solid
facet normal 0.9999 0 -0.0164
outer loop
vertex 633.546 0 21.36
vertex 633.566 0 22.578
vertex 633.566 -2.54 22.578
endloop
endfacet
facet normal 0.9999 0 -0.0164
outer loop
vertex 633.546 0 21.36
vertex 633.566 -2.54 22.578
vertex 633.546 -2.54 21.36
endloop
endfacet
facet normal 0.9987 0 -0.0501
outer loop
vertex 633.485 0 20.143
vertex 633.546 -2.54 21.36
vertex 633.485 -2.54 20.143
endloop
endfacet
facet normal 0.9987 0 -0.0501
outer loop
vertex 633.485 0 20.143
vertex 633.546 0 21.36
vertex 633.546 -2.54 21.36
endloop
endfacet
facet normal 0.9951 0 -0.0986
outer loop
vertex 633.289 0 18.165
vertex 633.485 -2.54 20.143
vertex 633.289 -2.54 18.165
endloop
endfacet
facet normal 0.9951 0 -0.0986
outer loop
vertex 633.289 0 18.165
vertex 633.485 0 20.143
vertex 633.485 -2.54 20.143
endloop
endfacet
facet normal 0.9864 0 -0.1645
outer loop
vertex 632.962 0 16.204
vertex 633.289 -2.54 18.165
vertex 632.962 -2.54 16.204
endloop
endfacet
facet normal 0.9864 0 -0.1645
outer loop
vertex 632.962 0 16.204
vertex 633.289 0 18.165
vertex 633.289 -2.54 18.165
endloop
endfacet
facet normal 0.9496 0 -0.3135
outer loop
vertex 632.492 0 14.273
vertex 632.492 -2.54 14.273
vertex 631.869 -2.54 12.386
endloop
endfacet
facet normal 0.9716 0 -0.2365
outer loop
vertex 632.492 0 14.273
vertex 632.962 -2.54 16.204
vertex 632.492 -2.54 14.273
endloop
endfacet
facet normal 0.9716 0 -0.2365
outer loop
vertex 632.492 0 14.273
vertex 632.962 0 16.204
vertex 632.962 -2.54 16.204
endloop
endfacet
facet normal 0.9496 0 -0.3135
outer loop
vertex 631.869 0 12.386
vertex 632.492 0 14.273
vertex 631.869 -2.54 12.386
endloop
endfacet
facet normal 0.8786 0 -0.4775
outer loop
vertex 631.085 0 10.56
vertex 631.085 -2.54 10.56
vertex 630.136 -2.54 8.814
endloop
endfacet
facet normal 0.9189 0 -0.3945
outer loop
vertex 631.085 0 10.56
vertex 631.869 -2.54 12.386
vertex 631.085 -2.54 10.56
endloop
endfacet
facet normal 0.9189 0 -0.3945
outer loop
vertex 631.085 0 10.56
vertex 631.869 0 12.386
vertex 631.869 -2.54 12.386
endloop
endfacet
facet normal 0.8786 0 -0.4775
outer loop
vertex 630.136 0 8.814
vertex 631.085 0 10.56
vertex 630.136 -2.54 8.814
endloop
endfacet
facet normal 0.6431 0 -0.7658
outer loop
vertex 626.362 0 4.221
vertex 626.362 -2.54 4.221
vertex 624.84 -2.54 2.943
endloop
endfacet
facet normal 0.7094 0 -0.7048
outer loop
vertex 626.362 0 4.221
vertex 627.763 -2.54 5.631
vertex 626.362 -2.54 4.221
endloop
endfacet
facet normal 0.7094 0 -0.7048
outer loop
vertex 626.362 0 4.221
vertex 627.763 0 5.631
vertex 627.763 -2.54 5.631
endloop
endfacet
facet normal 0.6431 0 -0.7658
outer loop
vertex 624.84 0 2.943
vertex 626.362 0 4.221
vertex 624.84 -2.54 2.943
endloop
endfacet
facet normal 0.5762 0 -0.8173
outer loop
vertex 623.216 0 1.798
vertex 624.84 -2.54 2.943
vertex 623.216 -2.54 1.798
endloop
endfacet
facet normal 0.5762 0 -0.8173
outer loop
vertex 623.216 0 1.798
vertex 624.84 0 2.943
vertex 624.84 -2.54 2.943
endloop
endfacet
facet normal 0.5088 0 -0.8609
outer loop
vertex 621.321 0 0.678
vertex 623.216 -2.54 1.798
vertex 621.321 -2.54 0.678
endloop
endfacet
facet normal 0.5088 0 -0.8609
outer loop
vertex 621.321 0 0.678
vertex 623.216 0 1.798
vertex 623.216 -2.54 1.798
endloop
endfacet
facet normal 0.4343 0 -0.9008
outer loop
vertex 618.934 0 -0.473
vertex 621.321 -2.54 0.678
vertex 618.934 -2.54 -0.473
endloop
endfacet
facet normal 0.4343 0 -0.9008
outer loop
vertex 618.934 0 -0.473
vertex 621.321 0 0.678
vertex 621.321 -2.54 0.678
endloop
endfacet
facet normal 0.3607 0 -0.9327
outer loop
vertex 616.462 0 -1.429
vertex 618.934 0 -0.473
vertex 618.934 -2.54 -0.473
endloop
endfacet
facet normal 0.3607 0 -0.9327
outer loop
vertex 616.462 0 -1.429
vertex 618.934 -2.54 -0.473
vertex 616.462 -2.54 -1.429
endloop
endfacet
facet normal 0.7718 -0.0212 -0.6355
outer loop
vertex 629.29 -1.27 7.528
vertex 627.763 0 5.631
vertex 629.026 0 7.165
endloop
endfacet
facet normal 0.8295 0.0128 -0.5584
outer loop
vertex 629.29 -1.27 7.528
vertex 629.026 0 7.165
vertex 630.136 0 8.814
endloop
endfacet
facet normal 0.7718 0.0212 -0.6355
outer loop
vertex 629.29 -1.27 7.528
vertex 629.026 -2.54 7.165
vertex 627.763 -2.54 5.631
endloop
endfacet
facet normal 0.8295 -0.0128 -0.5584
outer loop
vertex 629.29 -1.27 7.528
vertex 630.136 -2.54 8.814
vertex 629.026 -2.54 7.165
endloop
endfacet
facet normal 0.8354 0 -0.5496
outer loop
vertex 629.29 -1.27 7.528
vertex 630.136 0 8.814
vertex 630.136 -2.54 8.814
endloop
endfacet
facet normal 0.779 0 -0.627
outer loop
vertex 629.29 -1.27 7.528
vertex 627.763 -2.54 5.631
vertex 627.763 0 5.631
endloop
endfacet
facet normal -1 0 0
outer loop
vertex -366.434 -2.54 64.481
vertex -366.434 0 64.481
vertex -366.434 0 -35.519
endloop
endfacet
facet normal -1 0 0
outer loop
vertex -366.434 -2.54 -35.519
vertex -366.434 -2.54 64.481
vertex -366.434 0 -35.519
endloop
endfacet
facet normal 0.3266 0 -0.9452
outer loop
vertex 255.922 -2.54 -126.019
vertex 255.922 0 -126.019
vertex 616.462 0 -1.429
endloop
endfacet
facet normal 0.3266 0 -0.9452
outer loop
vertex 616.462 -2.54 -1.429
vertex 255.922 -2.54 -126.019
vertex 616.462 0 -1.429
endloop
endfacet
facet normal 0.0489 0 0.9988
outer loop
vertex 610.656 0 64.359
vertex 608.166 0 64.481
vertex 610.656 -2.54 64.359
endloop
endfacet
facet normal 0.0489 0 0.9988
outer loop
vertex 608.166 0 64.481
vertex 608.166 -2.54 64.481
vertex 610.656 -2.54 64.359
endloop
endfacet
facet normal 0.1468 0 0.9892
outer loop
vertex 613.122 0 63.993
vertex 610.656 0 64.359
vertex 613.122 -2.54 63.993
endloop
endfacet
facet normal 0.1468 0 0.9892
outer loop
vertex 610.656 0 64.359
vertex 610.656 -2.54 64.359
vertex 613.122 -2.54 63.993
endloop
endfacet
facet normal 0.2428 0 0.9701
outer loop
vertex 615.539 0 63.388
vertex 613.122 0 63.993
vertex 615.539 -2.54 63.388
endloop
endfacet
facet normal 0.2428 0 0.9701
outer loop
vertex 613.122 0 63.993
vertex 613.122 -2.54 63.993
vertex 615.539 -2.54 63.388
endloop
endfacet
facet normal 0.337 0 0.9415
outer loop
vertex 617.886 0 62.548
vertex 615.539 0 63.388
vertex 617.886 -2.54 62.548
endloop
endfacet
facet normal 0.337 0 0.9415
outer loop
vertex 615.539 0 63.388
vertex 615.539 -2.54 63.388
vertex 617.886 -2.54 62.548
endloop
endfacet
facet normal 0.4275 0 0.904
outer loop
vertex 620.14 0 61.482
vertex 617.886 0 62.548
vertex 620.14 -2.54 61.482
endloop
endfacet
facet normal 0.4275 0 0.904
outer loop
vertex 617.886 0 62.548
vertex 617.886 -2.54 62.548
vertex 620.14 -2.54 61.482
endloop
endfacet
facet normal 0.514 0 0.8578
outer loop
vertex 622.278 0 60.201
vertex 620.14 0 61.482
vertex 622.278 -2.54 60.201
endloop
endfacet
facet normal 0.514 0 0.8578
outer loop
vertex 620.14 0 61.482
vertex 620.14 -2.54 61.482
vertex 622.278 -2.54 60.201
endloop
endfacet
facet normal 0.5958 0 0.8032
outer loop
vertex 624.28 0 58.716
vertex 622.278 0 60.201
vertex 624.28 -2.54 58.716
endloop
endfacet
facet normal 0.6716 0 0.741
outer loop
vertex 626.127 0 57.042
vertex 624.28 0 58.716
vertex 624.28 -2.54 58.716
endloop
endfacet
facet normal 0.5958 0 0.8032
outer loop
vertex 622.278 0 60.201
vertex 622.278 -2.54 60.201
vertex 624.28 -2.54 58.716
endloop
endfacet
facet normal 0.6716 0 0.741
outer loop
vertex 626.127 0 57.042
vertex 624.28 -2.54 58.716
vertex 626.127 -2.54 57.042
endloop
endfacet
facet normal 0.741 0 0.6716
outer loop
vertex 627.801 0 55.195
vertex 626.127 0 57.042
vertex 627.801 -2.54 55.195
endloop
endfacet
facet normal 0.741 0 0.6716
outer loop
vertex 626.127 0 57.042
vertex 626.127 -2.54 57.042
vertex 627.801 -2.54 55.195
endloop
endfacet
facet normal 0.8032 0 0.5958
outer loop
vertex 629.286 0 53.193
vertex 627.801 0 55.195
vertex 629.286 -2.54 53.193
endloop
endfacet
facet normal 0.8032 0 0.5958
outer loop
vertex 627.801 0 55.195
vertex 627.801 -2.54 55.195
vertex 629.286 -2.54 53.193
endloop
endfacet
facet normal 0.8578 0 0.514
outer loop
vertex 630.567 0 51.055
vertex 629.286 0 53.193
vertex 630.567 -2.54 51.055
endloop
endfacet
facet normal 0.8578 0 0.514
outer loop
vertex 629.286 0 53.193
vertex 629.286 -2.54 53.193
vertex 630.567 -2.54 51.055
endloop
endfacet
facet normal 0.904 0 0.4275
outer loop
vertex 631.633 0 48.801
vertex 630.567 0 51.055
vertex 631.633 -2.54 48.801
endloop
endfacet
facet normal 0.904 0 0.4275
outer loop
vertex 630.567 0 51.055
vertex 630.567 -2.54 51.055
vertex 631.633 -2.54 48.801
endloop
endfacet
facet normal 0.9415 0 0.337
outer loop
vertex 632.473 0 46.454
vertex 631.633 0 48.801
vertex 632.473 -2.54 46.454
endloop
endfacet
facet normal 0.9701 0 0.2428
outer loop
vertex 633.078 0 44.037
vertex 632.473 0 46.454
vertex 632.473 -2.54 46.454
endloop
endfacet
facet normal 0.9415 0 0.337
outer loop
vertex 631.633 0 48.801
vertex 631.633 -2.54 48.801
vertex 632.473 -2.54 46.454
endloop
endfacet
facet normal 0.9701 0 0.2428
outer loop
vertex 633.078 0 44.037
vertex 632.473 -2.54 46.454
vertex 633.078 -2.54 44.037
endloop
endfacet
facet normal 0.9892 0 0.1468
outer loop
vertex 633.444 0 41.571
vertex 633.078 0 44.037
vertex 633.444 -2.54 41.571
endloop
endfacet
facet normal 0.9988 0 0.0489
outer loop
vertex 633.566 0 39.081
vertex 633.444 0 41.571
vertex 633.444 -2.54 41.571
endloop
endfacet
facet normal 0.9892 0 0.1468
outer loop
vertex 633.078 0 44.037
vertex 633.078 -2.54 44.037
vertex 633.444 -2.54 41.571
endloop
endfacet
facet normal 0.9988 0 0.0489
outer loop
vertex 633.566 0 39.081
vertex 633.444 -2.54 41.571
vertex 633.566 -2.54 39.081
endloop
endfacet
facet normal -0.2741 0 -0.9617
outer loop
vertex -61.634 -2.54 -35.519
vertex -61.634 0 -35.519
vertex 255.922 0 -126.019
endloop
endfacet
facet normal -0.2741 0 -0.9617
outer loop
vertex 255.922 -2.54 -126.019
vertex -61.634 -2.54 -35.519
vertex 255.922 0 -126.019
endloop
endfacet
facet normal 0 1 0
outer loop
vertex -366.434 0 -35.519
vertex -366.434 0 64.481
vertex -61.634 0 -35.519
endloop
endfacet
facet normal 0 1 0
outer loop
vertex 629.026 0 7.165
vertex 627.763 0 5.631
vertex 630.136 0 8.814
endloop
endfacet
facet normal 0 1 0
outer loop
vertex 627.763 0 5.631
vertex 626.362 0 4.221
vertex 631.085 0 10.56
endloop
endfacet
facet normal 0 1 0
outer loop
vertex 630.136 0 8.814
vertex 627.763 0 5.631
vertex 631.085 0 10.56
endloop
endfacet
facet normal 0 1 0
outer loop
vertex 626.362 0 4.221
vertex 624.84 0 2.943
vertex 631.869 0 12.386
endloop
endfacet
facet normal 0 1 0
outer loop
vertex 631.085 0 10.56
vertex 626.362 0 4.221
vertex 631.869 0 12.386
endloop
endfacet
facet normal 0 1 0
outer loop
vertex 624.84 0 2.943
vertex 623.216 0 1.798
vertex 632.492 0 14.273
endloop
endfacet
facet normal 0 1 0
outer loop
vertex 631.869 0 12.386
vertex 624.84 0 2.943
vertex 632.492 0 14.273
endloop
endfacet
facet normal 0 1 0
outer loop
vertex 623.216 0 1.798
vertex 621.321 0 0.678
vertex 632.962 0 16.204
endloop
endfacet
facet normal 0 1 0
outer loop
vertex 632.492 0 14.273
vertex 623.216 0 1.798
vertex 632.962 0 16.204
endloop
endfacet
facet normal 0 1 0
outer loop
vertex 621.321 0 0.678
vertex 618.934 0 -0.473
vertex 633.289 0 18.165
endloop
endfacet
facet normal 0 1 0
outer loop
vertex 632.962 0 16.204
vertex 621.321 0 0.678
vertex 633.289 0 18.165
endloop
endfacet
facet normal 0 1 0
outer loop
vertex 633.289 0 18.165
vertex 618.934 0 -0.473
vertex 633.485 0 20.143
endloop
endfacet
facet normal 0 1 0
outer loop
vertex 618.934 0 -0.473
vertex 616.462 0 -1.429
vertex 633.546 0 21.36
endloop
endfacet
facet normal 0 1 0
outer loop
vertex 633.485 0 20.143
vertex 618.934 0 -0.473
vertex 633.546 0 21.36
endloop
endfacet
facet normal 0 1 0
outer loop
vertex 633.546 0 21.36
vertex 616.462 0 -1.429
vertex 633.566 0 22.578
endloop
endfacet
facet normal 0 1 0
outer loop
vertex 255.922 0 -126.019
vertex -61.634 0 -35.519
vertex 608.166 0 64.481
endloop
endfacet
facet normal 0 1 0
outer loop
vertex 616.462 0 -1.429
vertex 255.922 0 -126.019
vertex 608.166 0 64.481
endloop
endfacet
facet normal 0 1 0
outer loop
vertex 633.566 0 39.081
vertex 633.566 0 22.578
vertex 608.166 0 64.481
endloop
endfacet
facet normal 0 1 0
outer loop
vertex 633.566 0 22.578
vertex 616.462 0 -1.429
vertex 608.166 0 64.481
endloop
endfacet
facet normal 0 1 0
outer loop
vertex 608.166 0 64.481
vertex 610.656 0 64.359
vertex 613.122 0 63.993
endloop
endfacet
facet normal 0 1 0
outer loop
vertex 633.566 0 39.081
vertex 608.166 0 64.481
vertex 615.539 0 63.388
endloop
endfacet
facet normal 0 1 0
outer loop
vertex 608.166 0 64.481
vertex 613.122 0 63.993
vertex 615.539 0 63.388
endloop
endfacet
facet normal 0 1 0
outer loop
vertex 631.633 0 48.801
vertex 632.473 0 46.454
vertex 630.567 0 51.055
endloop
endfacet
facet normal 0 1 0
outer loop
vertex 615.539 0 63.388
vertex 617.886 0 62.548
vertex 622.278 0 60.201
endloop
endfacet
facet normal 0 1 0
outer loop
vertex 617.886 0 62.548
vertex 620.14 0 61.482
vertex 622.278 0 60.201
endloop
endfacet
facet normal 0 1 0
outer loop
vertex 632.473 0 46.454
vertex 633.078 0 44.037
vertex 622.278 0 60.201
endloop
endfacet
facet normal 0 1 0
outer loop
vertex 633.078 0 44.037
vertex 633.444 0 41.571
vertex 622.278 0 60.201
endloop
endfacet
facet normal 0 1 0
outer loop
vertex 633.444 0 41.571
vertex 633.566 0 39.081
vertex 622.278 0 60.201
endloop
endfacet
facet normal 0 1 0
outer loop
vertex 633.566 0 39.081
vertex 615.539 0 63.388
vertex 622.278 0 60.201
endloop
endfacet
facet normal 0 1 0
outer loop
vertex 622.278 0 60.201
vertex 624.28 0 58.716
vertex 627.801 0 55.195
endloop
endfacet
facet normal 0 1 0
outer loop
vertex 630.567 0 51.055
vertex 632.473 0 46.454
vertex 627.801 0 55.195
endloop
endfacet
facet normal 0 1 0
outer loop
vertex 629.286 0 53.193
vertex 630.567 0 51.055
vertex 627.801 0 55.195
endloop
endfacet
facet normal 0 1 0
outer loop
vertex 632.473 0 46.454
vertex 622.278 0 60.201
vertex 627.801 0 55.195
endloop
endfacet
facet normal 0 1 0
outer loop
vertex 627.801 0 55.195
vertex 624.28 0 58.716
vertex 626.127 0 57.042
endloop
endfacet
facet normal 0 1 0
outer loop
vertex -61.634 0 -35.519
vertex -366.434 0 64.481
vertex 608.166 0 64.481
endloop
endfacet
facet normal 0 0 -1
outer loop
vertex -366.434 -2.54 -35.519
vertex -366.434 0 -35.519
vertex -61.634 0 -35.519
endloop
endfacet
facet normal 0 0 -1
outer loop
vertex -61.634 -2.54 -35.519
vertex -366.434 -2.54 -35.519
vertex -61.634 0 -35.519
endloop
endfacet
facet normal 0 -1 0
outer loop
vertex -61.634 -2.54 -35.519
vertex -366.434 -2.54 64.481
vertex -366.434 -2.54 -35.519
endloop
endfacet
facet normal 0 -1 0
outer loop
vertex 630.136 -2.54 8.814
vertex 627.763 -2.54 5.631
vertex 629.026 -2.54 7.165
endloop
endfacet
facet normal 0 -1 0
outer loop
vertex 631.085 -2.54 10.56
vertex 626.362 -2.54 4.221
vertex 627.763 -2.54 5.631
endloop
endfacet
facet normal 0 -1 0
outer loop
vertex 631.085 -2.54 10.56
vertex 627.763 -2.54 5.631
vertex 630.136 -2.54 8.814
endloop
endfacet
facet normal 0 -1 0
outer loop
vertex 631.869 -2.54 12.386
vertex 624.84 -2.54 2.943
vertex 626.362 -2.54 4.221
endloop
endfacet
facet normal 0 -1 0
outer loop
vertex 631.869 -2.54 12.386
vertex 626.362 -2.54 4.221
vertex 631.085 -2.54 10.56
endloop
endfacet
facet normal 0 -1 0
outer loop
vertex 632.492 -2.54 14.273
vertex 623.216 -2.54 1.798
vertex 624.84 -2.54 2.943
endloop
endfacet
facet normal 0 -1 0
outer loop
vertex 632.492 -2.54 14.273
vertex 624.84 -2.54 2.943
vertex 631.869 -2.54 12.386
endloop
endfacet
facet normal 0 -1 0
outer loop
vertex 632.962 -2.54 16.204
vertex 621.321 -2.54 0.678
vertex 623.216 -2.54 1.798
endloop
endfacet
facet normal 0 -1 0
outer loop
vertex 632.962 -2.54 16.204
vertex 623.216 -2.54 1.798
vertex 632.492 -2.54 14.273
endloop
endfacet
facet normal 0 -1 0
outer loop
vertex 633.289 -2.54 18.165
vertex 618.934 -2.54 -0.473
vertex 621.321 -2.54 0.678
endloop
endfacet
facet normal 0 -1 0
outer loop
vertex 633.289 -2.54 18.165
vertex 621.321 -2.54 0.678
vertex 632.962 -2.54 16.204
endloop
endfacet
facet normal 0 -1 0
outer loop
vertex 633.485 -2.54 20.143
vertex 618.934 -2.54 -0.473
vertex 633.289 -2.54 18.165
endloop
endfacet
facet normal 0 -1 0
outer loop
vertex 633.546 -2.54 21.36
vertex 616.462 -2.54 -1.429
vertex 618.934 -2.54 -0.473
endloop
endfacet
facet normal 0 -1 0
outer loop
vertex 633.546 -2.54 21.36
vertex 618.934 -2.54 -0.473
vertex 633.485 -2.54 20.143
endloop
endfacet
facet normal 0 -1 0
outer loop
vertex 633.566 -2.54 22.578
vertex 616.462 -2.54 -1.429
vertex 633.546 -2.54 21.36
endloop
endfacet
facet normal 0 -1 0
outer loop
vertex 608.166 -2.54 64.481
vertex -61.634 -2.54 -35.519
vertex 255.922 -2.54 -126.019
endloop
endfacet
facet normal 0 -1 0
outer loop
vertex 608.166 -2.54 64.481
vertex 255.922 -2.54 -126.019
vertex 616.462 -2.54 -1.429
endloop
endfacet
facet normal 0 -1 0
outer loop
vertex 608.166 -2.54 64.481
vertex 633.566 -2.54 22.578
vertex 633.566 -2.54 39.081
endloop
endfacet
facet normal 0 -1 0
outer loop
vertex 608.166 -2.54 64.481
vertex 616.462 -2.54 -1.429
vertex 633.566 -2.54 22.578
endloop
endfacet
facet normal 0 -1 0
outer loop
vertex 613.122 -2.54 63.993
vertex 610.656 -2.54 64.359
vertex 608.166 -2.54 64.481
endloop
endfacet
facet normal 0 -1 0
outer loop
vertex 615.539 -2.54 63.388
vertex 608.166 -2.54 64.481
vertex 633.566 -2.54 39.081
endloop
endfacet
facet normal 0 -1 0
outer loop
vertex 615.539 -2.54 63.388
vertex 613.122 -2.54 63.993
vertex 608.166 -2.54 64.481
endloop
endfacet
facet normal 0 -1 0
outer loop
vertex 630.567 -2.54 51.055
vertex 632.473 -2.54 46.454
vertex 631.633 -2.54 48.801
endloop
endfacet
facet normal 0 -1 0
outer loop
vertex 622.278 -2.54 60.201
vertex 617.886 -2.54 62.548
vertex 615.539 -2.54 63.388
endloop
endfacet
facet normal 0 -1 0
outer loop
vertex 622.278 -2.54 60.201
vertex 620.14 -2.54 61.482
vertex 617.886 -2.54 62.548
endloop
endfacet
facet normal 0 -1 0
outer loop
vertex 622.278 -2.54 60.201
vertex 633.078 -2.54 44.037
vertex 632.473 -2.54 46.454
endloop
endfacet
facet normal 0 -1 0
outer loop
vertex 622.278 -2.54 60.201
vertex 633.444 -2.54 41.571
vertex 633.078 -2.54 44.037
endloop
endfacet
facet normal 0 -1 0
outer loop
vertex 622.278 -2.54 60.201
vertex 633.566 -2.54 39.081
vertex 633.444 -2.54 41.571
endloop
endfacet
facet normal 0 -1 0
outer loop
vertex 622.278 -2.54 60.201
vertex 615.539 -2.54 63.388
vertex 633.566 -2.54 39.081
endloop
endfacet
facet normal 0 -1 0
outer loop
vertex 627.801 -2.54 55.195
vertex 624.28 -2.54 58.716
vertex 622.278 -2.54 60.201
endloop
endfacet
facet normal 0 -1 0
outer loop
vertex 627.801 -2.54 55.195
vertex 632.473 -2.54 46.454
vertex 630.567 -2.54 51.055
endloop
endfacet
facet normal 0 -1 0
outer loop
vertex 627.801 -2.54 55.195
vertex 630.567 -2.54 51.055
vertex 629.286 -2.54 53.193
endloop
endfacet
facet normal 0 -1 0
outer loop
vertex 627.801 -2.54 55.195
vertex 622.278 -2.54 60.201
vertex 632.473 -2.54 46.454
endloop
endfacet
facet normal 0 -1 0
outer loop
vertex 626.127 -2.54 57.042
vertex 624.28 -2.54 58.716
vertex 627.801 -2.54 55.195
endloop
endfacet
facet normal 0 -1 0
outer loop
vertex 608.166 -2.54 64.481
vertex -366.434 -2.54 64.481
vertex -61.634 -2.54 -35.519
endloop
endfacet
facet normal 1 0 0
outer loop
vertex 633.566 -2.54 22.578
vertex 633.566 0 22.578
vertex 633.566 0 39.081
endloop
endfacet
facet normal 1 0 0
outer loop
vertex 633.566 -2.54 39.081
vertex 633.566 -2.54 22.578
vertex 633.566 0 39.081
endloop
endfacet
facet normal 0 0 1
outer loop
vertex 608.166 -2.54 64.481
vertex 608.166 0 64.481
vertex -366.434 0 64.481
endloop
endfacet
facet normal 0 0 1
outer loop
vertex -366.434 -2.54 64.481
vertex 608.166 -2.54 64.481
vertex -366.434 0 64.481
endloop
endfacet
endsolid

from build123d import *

# Parameters (mm, degrees)
F1_DEPTH    = 2.54
F2_R        = 25.4
F3_T1_DEPTH = 93.0224467373


# Not quite as in the source:
# - a fillet or chamfer that OpenCascade refuses, or shapes differently, is made with other operations: its cross-section is extruded or revolved along the edge and cut away or added


with BuildPart() as f1:
    # F0 (on Front) → F1 (new body)
    with BuildSketch(Plane.XZ):
        Polygon((633.5662589781, 64.4812225811), (-366.4342810219, 64.4812225811), (-366.4342810219, -35.5188314189), (-61.6342810219, -35.5188314189), (255.9216834619, -126.0188282189), (633.5662589781, 4.4813425811), align=None)
    extrude(amount=F1_DEPTH)

    # F2
    f2_edges = [f1.edges().sort_by_distance(p)[0] for p in [
        (633.566259, -1.27, 64.481223),
    ]]
    fillet(f2_edges, radius=F2_R)

    # F3: fillet of radius 25.4 on 1 edges, made by hand

    # F3_s2 → F3_t1 (cut)
    with BuildSketch(Plane.XZ.offset(-45.2412233686)):
        with BuildLine():
            add(Edge.make_bspline(
                [(633.5662589781, 22.5778319285), (633.5662589781, 4.4813425811), (616.4622095682, -1.4291921229)],
                knots=[0, 0, 0, 1, 1, 1], degree=2, weights=[1, 1, 1]))
            Line((616.4622095682, -1.4291921229), (633.5662589781, 4.4813425811))
            Line((633.5662589781, 4.4813425811), (633.5662589781, 22.5778319285))
        make_face()
    extrude(amount=F3_T1_DEPTH, mode=Mode.SUBTRACT)


solid = f1.part
